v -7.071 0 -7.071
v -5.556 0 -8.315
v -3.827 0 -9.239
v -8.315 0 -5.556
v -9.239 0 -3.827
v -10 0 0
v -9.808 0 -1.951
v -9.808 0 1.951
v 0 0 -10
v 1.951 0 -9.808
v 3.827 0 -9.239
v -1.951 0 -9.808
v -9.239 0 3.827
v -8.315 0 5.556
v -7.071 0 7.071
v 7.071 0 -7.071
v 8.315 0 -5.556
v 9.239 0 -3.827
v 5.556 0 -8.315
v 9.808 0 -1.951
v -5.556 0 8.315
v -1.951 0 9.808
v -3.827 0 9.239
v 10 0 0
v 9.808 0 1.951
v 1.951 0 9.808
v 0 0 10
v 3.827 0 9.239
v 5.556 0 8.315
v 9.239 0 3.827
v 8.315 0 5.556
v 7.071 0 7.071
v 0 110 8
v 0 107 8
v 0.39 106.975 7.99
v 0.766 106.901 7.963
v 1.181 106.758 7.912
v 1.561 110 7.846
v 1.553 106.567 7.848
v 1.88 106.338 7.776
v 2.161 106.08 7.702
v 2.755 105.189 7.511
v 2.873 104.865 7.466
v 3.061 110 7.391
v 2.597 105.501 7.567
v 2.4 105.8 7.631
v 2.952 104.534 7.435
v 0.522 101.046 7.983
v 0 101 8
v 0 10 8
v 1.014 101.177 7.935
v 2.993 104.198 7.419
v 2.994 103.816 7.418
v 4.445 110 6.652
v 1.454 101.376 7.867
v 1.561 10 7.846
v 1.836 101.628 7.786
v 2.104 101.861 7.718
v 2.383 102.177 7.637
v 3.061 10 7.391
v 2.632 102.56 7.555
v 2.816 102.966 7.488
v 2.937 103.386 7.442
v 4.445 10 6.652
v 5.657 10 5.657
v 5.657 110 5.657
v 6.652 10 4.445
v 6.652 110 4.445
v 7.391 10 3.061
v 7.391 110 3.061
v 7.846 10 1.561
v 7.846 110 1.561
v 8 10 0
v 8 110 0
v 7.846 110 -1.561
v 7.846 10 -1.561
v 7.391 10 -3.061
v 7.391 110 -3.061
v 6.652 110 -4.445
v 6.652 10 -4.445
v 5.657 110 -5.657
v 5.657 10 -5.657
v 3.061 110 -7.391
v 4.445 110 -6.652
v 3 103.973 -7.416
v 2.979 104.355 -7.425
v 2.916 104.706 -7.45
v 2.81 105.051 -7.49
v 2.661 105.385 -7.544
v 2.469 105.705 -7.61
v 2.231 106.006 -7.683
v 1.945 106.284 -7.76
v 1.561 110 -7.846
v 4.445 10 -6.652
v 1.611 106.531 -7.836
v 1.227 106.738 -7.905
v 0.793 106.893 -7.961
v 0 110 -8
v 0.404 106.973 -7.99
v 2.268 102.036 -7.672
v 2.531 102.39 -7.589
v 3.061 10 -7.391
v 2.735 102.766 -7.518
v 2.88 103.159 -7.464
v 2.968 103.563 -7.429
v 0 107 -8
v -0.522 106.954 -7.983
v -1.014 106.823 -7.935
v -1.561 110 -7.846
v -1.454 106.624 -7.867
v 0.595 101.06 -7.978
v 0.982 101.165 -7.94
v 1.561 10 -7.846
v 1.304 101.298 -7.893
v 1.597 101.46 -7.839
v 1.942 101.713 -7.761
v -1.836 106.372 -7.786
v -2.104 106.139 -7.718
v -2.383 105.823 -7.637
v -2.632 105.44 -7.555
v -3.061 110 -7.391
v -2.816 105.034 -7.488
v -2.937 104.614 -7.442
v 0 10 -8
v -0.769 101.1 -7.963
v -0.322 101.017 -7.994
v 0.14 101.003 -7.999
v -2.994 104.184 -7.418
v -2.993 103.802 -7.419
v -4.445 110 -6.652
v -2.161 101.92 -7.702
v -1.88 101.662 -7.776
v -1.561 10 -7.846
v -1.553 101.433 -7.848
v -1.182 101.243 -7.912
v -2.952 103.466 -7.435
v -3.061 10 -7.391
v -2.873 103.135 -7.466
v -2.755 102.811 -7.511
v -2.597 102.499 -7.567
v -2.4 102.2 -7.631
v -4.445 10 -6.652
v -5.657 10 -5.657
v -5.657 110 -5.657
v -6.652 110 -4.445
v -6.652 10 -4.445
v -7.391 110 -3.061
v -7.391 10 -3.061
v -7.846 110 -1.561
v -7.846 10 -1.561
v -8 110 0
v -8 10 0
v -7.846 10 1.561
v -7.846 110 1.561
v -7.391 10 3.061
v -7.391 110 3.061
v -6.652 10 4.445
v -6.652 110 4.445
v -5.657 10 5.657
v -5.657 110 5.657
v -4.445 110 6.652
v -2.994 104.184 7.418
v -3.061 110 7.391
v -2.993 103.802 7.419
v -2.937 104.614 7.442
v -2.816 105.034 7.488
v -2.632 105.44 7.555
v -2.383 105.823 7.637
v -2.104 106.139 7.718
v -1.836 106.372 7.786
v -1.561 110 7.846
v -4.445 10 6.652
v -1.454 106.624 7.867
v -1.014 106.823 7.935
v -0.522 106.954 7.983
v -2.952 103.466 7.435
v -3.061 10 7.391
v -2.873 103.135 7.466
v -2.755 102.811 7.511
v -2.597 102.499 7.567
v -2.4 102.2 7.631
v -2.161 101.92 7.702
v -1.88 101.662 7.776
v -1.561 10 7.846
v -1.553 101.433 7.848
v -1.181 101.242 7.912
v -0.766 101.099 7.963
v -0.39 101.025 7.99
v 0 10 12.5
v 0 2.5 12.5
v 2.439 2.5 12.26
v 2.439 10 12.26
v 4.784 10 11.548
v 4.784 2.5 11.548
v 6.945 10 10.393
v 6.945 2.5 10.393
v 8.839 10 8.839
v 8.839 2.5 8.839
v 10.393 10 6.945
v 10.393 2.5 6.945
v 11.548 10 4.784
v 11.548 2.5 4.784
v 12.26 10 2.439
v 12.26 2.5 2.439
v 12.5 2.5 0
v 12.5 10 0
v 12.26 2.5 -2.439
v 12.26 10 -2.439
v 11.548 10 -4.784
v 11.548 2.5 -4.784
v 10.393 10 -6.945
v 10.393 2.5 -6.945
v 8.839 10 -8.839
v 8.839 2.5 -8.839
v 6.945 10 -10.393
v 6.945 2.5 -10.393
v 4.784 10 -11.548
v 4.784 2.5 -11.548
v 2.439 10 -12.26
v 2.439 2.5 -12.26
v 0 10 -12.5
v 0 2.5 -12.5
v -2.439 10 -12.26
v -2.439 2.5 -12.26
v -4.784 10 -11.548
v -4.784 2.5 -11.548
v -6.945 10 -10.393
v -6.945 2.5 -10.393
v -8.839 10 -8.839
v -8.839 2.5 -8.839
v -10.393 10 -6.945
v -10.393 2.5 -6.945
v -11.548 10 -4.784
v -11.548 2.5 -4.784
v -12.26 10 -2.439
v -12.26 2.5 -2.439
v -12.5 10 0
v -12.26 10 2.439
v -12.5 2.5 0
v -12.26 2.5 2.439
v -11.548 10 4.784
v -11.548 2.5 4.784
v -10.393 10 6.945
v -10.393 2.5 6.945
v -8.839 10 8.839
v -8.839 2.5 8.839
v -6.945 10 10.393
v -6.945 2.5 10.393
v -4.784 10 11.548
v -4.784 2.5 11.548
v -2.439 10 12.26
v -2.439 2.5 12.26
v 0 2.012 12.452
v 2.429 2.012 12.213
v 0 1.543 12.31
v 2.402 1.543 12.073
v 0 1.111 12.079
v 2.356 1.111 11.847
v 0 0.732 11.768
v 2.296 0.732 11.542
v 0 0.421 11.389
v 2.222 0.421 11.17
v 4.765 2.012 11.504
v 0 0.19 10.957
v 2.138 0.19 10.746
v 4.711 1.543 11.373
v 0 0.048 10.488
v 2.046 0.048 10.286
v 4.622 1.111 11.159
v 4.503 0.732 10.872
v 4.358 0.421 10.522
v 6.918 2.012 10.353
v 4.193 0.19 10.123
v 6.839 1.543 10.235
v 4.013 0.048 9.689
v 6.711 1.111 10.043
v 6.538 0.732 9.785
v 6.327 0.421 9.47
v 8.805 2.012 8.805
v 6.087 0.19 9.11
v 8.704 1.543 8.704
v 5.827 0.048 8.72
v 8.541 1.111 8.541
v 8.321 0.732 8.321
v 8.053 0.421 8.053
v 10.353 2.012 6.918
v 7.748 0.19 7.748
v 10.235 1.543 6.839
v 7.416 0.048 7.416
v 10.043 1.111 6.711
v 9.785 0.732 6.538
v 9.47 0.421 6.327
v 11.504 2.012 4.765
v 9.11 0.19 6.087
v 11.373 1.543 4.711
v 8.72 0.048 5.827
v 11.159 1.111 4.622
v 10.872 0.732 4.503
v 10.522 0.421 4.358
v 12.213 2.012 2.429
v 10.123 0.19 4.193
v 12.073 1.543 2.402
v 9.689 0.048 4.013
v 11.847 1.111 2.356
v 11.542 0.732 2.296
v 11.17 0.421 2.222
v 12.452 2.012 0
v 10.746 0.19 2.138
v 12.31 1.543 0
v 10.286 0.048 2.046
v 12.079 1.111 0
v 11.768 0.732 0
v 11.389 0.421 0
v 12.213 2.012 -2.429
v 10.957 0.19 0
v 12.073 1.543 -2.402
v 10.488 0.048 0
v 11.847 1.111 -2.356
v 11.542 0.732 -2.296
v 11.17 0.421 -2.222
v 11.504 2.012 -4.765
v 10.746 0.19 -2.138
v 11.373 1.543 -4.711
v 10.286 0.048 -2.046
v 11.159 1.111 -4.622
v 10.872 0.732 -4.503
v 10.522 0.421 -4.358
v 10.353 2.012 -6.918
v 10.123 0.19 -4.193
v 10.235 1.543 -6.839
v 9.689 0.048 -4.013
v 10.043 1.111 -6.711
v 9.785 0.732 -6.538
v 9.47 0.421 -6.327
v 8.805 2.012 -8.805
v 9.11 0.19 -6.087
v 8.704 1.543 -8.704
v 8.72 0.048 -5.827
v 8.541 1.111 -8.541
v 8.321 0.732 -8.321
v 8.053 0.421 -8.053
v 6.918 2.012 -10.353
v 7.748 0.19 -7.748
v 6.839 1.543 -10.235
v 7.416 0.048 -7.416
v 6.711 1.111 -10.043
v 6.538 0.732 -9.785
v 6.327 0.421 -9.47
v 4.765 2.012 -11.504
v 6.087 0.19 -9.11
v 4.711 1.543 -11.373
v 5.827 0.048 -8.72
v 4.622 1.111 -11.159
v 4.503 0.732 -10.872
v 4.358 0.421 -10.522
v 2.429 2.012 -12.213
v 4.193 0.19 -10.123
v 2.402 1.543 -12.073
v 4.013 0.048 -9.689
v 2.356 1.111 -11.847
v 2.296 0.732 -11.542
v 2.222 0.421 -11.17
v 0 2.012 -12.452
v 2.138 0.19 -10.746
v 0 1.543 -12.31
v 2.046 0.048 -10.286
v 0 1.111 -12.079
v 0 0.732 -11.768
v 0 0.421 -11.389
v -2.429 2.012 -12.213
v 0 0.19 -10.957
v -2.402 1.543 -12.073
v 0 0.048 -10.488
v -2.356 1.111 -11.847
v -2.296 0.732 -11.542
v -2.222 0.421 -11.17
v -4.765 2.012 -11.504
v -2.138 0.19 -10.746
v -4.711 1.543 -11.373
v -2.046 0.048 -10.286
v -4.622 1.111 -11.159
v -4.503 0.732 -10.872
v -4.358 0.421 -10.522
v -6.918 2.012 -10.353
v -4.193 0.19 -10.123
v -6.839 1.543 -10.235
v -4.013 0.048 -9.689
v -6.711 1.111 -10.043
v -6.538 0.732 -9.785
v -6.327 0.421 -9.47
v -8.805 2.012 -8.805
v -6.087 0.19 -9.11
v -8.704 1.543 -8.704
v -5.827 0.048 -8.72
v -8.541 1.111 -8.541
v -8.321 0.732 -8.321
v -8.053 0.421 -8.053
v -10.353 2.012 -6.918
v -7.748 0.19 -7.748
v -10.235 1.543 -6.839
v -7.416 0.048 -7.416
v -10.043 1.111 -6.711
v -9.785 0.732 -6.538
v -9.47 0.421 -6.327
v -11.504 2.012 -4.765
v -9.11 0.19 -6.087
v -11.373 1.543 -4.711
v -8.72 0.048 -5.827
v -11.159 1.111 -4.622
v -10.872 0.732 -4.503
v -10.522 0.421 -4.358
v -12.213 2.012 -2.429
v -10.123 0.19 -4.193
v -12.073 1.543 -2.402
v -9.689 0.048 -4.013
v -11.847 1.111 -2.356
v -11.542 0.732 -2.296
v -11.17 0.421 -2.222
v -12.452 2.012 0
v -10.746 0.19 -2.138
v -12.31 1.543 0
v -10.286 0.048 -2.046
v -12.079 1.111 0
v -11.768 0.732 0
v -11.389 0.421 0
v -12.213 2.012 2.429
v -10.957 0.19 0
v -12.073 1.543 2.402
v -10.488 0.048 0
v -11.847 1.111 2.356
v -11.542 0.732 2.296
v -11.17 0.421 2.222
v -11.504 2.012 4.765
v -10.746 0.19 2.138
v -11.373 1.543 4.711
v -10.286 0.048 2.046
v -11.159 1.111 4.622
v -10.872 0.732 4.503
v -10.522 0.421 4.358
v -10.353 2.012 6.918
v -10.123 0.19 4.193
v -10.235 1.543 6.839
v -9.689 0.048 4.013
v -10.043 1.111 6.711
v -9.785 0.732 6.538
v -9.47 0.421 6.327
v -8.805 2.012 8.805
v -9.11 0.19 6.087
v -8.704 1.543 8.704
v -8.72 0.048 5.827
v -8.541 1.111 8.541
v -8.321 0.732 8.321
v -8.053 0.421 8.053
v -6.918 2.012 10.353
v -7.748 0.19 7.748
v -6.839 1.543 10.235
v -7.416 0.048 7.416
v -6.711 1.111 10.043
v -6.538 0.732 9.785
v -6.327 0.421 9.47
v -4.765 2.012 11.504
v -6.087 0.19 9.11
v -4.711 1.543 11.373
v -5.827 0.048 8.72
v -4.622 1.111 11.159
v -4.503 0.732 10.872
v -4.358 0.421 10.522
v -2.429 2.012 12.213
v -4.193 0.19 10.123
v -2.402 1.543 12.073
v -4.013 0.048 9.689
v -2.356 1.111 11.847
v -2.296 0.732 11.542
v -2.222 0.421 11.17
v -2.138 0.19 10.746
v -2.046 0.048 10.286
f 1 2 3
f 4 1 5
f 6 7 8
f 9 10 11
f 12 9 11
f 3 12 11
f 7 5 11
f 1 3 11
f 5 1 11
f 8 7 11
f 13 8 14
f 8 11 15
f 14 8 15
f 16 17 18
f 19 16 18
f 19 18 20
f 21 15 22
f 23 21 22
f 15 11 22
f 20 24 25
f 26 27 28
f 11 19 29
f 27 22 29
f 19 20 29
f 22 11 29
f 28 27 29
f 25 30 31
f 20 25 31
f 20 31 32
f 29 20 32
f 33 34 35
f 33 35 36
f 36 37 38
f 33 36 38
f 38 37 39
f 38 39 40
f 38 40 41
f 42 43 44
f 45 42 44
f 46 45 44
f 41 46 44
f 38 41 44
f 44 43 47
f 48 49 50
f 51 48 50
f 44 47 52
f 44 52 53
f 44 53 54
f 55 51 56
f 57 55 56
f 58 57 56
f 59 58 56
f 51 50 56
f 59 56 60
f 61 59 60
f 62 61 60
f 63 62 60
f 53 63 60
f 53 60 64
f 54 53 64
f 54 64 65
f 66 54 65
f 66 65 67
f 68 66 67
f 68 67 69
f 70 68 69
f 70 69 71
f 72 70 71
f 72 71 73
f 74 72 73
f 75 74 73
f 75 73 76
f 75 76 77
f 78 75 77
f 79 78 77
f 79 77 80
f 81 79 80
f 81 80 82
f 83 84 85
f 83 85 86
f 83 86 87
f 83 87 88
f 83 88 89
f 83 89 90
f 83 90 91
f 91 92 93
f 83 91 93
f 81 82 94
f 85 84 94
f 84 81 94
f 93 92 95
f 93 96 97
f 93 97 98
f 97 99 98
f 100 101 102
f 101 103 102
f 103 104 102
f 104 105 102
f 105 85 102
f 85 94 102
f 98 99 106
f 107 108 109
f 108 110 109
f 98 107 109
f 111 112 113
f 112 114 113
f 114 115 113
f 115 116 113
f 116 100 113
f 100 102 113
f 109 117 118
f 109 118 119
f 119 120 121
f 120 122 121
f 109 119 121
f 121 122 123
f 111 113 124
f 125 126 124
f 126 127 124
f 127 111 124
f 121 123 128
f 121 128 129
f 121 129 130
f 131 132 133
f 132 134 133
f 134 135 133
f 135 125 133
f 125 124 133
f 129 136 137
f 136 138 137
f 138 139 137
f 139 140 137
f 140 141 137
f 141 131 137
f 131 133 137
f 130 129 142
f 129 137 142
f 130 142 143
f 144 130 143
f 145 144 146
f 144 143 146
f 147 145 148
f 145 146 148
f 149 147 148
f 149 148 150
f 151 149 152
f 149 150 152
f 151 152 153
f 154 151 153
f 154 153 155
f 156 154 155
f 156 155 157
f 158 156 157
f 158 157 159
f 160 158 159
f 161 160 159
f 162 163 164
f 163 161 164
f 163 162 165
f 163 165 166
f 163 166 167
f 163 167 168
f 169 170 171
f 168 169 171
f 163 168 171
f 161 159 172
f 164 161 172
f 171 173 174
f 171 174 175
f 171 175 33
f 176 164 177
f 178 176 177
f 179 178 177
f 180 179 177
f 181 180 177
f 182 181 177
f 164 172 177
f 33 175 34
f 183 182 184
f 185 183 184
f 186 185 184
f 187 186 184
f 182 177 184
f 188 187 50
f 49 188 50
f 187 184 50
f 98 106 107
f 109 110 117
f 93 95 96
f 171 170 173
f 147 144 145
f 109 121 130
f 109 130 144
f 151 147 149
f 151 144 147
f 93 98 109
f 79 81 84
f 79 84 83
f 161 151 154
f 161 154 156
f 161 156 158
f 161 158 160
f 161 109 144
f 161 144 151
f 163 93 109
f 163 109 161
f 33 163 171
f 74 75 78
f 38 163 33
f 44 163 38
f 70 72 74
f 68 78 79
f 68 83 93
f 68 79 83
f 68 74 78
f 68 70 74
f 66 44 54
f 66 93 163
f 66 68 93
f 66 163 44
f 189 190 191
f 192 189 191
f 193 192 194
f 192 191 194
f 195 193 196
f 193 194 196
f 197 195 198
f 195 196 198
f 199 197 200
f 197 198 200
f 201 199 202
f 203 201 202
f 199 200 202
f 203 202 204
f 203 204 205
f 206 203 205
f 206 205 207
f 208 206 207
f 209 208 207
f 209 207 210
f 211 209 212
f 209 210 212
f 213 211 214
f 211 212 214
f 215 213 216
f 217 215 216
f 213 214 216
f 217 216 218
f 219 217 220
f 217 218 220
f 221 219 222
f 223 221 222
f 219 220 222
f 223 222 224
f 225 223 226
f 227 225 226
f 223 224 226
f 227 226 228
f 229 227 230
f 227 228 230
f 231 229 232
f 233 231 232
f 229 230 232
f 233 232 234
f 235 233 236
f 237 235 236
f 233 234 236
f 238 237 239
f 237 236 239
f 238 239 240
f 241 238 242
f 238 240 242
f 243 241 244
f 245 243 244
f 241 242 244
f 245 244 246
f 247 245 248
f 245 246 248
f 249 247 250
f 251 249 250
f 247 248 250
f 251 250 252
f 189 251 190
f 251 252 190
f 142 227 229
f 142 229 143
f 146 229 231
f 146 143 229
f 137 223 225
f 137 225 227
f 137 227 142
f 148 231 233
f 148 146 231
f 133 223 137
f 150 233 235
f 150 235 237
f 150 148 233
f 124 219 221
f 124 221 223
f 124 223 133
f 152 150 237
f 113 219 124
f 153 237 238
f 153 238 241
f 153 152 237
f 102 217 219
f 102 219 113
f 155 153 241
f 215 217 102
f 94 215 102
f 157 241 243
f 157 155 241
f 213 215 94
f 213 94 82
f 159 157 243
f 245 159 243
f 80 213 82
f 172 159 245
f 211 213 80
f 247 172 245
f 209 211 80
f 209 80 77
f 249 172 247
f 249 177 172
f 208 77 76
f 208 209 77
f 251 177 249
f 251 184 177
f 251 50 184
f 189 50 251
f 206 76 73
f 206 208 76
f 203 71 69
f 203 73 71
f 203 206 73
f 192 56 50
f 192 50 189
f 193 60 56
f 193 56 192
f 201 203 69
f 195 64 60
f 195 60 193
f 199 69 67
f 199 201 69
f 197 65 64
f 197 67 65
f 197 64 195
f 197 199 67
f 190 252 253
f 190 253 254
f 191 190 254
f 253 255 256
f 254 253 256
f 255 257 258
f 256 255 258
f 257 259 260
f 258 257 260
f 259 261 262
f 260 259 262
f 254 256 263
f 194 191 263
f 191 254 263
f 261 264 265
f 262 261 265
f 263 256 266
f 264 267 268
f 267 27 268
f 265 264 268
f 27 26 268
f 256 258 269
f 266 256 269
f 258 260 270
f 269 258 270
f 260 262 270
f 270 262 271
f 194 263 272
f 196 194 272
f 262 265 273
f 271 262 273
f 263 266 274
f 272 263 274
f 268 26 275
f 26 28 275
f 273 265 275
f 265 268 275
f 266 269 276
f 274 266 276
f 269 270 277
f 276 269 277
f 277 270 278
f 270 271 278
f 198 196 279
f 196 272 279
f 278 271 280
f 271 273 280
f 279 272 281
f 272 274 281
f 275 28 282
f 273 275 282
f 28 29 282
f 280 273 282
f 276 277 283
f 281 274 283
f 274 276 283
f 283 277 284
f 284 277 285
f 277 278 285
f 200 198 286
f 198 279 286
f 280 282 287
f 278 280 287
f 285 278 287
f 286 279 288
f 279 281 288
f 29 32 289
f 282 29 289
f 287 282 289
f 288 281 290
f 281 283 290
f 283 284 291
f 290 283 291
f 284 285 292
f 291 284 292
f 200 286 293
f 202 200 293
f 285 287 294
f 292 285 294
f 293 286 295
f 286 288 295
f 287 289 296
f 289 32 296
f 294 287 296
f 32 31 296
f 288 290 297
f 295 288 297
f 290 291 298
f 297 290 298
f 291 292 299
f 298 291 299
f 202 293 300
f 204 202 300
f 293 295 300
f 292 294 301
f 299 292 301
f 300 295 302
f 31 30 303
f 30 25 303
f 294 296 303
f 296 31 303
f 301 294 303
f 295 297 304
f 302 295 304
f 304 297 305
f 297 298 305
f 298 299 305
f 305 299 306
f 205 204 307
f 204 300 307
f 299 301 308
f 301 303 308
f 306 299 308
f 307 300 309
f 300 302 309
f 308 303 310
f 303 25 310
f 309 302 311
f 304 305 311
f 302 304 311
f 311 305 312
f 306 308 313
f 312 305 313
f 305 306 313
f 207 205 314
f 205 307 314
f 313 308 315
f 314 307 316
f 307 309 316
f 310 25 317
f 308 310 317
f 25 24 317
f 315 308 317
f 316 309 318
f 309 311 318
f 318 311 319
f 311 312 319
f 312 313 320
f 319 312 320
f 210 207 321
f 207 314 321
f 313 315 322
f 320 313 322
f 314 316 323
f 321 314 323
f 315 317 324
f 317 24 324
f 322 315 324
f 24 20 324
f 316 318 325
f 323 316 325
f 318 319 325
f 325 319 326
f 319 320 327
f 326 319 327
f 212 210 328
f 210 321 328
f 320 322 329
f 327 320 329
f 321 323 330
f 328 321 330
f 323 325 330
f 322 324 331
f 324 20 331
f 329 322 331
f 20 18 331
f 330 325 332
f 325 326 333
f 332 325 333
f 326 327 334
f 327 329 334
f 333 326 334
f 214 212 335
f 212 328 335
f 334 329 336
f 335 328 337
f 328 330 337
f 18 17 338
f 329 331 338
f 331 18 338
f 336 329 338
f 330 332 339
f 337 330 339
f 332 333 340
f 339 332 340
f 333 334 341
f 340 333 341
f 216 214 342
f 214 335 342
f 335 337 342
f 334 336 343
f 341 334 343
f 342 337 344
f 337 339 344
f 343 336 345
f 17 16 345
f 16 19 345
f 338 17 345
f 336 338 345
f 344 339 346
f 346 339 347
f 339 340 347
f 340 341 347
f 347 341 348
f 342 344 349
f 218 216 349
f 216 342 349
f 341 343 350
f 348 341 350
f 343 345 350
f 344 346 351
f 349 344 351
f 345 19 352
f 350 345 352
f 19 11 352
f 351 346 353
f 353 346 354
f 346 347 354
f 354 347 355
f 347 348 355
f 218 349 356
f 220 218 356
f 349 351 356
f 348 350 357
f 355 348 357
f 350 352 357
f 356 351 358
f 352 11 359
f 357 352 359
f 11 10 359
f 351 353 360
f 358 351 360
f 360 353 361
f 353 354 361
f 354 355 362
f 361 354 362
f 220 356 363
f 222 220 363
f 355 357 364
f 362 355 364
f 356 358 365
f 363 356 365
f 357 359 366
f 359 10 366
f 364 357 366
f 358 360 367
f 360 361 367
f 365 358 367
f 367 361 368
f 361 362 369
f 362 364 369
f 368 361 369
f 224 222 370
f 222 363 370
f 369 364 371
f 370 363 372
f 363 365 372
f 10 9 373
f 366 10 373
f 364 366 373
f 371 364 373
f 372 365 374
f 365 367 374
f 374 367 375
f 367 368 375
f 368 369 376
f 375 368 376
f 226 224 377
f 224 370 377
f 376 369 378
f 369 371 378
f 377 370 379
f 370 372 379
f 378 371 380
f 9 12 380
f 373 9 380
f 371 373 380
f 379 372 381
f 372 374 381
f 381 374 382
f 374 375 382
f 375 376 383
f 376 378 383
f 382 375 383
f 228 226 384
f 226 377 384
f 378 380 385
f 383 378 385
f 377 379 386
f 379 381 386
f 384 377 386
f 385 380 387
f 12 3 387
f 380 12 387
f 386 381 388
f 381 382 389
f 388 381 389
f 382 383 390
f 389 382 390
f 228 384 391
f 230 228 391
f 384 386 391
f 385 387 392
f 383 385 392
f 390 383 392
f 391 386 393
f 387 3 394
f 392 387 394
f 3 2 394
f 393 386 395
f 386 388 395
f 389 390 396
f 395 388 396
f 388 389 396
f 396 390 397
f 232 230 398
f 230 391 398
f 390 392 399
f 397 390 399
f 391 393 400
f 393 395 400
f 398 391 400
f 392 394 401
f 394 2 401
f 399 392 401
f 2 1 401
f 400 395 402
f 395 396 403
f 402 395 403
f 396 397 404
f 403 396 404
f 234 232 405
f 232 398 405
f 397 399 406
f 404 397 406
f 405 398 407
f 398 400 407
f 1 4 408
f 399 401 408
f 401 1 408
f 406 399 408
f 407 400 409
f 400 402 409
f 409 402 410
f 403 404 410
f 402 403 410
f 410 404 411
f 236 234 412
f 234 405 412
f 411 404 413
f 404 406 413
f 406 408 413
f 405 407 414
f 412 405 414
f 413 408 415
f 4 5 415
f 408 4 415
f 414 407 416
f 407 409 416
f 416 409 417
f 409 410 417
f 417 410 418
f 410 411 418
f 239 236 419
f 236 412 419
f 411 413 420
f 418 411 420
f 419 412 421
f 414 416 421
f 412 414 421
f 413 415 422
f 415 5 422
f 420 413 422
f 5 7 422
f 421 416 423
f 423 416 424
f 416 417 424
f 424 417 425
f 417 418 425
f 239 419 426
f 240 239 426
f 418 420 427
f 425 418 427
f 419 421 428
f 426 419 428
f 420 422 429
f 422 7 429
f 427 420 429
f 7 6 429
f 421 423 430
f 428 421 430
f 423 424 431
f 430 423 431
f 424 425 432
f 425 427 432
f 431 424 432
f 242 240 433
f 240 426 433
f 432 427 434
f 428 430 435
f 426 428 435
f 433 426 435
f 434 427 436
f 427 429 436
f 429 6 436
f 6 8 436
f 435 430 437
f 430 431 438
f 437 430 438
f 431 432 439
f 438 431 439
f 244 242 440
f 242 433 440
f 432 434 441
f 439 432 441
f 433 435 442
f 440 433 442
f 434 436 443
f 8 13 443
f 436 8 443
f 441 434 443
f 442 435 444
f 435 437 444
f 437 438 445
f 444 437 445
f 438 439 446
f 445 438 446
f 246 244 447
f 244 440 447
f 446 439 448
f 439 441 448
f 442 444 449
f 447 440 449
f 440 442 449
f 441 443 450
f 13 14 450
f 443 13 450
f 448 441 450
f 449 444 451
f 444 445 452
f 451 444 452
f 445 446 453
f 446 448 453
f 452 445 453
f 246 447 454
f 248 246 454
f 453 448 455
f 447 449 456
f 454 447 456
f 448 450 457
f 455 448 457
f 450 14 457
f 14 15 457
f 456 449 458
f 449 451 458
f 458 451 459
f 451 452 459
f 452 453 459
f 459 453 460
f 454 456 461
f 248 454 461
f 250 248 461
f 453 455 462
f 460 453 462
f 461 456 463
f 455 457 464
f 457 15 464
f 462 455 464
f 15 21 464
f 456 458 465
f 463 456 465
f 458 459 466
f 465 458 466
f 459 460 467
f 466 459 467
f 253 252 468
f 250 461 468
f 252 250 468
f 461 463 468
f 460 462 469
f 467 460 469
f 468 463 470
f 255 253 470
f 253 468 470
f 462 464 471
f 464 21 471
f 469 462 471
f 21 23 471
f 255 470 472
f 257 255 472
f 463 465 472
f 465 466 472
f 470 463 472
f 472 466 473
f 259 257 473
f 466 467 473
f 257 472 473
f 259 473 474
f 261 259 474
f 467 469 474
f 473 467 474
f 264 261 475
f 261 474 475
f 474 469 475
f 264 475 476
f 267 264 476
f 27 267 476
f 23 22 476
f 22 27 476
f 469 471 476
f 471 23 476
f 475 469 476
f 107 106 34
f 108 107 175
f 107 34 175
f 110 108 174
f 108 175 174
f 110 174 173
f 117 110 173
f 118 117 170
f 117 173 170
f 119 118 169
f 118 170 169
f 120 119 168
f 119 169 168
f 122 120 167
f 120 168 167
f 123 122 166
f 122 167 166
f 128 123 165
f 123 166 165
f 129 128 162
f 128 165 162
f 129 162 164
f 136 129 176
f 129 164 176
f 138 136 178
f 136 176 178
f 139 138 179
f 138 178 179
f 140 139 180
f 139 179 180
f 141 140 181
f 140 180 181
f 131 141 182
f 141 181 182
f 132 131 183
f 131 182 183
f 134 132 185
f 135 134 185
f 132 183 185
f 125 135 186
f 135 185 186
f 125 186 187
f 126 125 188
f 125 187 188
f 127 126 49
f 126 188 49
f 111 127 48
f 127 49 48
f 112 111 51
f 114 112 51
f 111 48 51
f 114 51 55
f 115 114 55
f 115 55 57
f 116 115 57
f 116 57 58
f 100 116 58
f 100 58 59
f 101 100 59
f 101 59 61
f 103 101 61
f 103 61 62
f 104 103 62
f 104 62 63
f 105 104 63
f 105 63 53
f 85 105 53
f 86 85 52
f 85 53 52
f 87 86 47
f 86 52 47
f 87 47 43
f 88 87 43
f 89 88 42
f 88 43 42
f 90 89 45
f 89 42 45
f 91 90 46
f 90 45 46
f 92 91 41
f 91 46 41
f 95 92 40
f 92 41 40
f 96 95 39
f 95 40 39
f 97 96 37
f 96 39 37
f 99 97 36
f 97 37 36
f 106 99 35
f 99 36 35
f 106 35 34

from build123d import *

# Parameters (mm, degrees)
SKETCH1_R           = 12.5
BOSS_EXTRUDE1_DEPTH = 10
FILLET1_R           = 2.5
SKETCH2_R           = 8
BOSS_EXTRUDE2_DEPTH = 100
SKETCH3_R           = 3
CUT_EXTRUDE1_DEPTH  = 50


with BuildPart() as part:
    # Sketch1 → Boss-Extrude1 (new body)
    with BuildSketch(Plane(origin=(0, 0, 0), x_dir=(1, 0, 0), z_dir=(0, 1, 0))):
        with Locations(Location((0, 0, 0), (0, 0, 270))):
            Circle(SKETCH1_R)
    extrude(amount=BOSS_EXTRUDE1_DEPTH)

    # Fillet1
    fillet1_edges = [part.edges().sort_by_distance(p)[0] for p in [
        (0, 0, -12.5),
    ]]
    fillet(fillet1_edges, radius=FILLET1_R)

    # Sketch2 → Boss-Extrude2 (add)
    with BuildSketch(Plane(origin=(0, 10, 0), x_dir=(1, 0, 0), z_dir=(0, 1, 0))):
        with Locations(Location((0, 0, 0), (0, 0, 270))):
            Circle(SKETCH2_R)
    extrude(amount=BOSS_EXTRUDE2_DEPTH)

    # Sketch3 → Cut-Extrude1 (cut, symmetric)
    with BuildSketch(Plane.XY):
        with Locations(Location((0, 104, 0), (0, 0, 90.000000025))):
            Circle(SKETCH3_R)
    extrude(amount=CUT_EXTRUDE1_DEPTH, both=True, mode=Mode.SUBTRACT)


solid = part.part
